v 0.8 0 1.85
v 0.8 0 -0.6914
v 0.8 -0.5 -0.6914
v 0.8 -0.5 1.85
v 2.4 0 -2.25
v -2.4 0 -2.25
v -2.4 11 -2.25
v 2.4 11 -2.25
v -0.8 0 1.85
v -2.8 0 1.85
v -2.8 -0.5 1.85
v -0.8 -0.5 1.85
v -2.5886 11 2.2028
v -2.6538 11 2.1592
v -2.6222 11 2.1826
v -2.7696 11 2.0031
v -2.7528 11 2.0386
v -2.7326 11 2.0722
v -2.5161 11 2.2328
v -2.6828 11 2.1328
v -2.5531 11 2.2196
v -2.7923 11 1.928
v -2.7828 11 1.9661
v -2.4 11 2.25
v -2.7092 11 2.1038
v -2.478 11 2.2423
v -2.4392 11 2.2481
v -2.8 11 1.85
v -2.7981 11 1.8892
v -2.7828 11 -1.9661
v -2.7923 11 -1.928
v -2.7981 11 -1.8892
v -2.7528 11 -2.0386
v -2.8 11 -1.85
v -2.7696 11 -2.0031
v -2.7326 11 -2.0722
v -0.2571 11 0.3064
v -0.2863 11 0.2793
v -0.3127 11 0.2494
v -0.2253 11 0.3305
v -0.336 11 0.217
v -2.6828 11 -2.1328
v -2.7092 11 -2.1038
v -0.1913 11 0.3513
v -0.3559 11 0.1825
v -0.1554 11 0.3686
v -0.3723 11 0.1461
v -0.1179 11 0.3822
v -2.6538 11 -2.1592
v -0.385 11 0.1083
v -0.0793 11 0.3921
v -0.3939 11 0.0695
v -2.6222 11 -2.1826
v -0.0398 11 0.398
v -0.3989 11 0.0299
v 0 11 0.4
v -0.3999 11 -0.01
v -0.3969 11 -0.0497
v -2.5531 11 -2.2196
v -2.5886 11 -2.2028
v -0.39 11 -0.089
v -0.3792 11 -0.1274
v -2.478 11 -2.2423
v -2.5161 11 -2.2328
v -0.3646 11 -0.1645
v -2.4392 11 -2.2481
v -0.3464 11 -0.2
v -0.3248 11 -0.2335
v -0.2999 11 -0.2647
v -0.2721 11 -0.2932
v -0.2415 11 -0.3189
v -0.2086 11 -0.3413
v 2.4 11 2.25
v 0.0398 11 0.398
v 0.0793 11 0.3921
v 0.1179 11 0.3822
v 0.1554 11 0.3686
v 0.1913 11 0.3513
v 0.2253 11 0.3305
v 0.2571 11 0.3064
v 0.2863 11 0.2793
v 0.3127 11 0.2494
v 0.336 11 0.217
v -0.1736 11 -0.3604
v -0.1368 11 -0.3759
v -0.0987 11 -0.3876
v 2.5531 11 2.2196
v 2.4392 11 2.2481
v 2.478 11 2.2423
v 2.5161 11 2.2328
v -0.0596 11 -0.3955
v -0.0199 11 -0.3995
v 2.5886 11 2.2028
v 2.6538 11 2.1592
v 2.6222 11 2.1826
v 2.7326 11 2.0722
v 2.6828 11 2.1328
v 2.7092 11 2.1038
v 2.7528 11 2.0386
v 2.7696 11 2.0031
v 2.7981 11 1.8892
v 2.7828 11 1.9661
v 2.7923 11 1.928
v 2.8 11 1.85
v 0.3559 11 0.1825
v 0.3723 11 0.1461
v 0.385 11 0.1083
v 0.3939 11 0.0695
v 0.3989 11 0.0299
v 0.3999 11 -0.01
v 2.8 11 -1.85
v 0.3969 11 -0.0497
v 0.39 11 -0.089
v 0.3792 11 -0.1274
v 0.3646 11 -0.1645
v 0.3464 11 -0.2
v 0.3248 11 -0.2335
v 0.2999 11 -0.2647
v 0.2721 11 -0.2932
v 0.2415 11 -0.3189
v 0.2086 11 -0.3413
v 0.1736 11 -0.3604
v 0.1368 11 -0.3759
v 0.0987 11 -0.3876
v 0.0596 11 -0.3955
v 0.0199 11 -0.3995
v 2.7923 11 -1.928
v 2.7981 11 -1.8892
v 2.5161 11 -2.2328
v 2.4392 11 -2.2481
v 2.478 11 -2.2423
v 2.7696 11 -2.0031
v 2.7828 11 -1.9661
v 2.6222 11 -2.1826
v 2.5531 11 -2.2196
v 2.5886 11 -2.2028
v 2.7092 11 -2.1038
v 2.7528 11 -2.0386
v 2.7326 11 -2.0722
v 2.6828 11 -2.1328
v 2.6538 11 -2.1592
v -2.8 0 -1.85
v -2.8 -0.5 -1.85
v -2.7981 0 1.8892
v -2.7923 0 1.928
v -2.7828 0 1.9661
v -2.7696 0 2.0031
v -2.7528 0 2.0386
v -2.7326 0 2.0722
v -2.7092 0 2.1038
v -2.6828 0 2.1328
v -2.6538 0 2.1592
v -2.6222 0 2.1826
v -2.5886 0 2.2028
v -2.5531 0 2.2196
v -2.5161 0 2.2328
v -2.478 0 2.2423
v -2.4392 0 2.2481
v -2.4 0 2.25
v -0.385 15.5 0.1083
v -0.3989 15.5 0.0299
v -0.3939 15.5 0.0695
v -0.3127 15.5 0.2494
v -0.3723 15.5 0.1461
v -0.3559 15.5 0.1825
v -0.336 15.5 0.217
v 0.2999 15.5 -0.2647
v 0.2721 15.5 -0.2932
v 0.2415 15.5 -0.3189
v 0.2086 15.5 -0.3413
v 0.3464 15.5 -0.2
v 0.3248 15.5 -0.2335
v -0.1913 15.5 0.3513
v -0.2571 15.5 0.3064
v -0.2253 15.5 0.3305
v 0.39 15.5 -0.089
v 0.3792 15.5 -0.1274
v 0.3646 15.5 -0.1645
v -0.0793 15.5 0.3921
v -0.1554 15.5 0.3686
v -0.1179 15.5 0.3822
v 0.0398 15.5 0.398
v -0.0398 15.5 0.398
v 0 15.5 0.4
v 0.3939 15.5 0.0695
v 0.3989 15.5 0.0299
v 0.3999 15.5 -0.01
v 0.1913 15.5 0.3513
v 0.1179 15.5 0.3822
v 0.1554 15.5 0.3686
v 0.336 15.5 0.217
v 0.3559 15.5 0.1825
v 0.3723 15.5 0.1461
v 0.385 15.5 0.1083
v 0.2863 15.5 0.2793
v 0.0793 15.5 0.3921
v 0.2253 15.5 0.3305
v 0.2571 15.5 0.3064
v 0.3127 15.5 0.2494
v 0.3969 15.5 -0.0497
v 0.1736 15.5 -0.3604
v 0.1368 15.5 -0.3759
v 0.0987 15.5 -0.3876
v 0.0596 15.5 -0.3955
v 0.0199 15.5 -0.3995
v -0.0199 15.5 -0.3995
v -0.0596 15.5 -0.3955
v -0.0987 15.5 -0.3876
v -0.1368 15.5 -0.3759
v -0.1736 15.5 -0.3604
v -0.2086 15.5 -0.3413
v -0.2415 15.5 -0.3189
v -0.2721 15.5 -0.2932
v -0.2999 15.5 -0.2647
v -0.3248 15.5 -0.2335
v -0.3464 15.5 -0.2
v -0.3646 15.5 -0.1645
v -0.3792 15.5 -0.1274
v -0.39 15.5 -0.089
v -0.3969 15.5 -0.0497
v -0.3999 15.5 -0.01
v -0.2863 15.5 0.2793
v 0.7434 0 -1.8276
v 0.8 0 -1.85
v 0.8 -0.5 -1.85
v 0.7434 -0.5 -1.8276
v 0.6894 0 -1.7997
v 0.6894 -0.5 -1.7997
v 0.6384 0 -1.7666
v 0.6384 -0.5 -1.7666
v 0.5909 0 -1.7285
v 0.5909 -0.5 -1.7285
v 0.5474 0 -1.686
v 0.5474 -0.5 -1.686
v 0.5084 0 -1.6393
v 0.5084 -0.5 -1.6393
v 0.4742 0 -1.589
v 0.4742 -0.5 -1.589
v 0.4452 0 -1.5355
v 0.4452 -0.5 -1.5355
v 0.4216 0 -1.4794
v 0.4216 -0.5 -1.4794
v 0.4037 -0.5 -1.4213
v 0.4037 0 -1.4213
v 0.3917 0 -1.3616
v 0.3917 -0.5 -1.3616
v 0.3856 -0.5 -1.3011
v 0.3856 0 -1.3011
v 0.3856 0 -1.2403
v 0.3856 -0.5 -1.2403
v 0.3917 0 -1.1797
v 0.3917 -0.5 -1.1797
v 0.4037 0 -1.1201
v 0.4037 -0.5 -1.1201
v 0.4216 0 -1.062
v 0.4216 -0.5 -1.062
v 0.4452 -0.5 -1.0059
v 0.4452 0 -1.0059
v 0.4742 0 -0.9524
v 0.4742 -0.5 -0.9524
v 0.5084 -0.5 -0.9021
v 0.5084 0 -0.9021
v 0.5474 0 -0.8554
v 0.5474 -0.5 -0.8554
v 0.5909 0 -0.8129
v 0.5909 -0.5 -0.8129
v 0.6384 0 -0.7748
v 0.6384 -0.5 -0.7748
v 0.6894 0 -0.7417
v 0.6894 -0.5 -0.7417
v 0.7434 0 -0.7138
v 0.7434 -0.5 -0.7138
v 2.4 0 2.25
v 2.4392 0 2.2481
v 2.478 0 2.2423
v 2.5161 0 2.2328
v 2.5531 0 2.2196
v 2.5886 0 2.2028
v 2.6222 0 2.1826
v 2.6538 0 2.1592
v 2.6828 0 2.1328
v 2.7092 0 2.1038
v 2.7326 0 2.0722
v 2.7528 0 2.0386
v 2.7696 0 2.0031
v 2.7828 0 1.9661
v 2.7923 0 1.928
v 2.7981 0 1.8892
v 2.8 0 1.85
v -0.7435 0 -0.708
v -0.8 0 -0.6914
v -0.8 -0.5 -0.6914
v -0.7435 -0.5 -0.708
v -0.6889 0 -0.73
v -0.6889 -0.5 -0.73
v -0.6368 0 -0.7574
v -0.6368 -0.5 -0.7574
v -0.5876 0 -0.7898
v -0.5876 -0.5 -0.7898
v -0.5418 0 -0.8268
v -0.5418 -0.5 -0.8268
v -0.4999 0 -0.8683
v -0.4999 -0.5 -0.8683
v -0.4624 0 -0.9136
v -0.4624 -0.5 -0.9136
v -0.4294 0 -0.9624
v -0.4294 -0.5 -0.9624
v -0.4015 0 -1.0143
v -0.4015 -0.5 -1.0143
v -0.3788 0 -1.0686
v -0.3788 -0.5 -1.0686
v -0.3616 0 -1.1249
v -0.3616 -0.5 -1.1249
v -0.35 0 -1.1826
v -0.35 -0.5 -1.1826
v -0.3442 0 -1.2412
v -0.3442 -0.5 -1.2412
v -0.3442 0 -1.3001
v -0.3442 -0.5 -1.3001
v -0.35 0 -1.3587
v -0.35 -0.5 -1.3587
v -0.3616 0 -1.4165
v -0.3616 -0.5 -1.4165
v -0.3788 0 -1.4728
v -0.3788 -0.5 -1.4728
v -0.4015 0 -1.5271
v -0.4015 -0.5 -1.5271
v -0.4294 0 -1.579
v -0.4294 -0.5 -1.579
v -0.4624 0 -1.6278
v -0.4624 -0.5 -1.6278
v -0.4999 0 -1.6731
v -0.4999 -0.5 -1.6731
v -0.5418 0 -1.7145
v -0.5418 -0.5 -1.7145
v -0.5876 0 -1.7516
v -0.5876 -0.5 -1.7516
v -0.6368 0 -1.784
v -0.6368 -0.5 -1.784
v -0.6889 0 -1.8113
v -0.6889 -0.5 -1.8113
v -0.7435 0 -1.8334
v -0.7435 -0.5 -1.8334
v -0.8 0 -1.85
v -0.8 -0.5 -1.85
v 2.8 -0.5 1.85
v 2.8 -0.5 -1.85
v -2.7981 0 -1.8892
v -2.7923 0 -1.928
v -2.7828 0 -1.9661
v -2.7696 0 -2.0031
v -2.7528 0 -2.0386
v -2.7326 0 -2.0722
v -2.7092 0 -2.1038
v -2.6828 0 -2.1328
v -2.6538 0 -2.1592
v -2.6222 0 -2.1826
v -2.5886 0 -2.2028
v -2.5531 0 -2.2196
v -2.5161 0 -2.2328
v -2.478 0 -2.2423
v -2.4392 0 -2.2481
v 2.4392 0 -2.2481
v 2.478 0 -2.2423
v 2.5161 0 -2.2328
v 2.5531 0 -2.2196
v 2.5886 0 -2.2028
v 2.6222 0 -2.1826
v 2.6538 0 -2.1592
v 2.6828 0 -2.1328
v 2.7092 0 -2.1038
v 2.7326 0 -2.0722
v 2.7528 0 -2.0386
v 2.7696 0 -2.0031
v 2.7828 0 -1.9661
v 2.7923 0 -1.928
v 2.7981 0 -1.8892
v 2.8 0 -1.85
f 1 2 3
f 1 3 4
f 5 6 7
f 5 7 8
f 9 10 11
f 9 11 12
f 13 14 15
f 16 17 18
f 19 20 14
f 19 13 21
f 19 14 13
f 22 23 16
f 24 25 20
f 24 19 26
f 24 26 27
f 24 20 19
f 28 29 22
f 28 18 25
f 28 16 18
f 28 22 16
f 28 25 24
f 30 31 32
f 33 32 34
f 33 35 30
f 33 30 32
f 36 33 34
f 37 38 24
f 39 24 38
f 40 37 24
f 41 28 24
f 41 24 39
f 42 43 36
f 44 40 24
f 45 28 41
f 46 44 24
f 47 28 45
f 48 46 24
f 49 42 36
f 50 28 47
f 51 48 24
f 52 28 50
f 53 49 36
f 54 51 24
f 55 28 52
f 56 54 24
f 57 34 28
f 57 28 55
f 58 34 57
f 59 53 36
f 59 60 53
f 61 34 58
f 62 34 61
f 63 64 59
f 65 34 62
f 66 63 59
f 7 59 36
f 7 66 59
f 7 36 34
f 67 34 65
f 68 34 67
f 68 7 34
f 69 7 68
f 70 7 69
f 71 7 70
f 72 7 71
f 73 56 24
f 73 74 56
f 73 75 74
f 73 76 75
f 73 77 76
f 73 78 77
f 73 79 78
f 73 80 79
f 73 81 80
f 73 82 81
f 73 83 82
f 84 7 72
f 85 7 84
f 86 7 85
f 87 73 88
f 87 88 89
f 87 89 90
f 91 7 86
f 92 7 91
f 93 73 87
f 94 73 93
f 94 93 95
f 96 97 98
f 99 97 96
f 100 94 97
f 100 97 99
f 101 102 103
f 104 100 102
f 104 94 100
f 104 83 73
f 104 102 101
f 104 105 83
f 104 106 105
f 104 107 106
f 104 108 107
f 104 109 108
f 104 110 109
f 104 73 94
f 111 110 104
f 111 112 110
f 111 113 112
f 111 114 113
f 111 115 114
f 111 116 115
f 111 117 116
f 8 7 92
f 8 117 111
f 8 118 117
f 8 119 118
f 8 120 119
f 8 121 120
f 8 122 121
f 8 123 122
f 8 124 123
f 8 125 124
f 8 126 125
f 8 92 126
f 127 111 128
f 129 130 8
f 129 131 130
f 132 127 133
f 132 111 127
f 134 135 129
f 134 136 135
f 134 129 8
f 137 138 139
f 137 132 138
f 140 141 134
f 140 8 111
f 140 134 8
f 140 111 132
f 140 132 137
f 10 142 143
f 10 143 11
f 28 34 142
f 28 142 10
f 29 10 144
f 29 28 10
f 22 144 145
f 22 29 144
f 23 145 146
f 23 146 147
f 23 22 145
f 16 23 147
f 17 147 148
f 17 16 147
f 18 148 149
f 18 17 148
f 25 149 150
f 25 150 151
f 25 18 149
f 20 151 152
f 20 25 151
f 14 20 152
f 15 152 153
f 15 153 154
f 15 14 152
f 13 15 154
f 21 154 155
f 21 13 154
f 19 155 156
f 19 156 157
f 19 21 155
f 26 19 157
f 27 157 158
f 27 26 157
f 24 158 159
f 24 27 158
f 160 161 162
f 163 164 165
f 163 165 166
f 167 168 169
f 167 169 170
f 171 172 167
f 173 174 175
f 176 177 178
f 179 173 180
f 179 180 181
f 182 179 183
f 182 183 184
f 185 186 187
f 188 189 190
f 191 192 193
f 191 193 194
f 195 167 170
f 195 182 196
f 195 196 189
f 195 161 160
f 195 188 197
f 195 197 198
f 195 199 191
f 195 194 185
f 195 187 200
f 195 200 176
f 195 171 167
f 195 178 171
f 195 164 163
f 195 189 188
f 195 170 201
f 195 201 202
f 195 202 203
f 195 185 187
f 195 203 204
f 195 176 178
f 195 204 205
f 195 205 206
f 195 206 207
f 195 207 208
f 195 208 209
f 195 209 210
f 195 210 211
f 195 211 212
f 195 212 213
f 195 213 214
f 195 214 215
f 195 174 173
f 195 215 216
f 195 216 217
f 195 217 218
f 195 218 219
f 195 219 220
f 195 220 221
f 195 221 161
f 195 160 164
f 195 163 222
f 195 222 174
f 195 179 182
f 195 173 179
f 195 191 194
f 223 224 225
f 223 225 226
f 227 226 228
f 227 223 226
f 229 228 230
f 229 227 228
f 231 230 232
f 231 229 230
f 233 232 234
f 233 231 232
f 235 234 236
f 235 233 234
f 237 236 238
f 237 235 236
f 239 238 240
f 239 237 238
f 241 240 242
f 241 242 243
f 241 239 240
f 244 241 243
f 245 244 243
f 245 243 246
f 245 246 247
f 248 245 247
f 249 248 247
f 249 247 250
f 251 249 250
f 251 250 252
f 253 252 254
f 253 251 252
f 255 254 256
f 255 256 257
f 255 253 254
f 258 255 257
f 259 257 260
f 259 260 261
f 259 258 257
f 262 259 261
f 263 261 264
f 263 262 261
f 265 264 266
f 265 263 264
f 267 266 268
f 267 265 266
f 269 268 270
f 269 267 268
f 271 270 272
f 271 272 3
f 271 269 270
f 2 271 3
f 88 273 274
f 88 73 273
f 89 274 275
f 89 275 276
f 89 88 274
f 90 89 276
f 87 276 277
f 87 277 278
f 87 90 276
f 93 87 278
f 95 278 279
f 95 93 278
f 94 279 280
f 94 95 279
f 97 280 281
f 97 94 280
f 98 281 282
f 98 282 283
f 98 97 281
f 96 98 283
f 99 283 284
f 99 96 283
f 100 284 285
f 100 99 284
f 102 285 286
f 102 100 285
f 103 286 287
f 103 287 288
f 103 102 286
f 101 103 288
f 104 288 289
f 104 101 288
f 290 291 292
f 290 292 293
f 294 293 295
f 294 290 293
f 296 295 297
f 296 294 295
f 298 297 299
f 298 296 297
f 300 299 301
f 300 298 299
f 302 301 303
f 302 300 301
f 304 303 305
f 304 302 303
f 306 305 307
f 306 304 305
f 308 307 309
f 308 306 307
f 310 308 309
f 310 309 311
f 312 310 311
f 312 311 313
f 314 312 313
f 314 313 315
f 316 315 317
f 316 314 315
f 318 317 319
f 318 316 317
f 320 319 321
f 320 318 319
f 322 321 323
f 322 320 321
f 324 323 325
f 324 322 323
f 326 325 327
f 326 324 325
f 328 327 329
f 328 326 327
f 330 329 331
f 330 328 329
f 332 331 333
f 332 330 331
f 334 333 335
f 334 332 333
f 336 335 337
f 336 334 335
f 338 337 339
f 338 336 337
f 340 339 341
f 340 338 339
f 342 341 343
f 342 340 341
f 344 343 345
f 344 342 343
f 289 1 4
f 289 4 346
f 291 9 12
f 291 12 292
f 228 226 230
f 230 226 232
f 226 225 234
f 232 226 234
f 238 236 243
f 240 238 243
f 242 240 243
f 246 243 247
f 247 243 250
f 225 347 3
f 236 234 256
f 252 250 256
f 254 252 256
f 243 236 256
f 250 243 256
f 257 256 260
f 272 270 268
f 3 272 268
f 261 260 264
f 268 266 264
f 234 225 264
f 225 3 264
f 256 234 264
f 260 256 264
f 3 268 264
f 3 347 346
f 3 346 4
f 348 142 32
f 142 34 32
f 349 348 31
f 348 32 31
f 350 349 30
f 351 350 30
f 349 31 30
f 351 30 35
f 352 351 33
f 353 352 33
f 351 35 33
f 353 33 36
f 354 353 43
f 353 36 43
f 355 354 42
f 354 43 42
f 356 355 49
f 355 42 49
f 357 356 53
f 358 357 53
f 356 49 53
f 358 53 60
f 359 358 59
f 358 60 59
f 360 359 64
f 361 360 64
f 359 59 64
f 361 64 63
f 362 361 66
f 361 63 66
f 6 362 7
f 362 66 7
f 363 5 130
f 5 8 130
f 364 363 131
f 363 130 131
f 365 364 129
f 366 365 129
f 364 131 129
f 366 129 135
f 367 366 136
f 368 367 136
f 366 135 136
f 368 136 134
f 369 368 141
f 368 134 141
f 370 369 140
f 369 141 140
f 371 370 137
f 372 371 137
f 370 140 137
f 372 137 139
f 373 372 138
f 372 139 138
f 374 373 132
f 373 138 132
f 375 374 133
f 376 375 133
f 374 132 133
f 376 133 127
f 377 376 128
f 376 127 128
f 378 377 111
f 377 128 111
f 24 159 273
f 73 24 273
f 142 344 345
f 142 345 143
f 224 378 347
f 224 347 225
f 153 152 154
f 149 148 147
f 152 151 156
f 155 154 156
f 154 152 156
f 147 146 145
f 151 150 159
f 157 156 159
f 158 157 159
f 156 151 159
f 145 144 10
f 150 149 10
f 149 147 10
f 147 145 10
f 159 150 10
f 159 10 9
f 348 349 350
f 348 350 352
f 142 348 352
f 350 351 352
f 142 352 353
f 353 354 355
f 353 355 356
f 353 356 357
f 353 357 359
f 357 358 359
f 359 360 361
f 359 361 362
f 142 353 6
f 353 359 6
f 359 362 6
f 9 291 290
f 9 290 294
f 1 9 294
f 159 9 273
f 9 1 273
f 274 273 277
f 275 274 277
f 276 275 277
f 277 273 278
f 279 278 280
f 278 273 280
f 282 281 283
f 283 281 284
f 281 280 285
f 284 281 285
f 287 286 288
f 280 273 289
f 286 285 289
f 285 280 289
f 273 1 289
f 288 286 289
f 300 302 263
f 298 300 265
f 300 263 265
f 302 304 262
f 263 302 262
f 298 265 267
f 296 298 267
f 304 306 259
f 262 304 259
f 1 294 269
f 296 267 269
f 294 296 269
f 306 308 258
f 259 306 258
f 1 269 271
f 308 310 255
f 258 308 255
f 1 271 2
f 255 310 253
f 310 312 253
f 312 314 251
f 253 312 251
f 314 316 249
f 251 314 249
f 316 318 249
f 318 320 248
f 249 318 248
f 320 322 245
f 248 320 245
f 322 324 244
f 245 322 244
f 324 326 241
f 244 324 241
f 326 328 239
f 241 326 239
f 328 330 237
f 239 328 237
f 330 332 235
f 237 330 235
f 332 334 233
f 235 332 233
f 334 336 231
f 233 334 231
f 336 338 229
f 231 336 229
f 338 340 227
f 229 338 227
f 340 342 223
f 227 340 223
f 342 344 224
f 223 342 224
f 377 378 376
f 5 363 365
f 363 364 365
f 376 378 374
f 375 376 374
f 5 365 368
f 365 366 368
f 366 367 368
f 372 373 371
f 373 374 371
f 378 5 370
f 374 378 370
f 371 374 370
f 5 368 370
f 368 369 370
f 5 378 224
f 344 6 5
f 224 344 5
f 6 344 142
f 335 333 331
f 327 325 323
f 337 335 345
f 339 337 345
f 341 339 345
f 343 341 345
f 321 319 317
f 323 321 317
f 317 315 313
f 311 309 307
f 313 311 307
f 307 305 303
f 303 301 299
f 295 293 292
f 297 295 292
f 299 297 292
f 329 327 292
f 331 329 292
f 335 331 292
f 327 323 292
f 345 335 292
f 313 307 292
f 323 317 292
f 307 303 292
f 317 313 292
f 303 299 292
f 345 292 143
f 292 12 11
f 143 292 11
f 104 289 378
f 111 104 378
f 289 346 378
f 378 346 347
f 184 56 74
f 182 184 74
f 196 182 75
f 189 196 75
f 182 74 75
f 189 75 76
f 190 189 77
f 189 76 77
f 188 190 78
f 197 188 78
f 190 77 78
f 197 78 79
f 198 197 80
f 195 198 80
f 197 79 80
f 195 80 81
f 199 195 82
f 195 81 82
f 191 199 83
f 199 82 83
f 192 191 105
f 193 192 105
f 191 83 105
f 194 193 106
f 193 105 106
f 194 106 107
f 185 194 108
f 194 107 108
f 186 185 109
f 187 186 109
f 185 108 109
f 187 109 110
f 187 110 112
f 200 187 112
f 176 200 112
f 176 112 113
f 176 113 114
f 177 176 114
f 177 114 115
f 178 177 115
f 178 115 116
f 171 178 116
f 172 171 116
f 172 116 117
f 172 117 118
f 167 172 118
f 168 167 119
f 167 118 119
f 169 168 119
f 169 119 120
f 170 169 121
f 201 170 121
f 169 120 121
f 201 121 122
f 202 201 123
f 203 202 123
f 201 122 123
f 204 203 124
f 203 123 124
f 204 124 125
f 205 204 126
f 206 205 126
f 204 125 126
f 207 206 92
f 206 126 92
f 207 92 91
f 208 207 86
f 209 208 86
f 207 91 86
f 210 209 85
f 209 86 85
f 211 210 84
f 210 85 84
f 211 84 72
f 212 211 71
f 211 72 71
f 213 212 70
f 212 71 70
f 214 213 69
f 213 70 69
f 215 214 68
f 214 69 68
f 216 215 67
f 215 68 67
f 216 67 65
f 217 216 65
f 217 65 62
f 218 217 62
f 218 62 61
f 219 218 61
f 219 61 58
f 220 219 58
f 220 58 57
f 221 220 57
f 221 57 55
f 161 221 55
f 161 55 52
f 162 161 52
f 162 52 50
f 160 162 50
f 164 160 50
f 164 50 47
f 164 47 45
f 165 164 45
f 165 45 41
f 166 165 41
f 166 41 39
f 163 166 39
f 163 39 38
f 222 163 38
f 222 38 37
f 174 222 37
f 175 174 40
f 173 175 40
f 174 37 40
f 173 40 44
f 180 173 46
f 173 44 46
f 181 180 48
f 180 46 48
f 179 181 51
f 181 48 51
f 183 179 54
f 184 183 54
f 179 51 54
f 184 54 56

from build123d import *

# Parameters (mm, degrees)
SKETCH1_W           = 5.6
SKETCH1_H           = 4.5
BOSS_EXTRUDE1_DEPTH = 11
SKETCH2_R           = 0.4
BOSS_EXTRUDE2_DEPTH = 4.5
FILLET1_R           = 0.4
BOSS_EXTRUDE3_DEPTH = 0.5


with BuildPart() as part:
    # Sketch1 → Boss-Extrude1 (new body)
    with BuildSketch(Plane(origin=(0, 0, 0), x_dir=(1, 0, 0), z_dir=(0, 1, 0))):
        Rectangle(SKETCH1_W, SKETCH1_H)
    extrude(amount=BOSS_EXTRUDE1_DEPTH)

    # Sketch2 → Boss-Extrude2 (add)
    with BuildSketch(Plane(origin=(0, 11, 0), x_dir=(1, 0, 0), z_dir=(0, 1, 0))):
        with Locations(Location((0, 0, 0), (0, 0, 270))):
            Circle(SKETCH2_R)
    extrude(amount=BOSS_EXTRUDE2_DEPTH)

    # Fillet1
    fillet1_edges = [part.edges().sort_by_distance(p)[0] for p in [
        (2.8, 5.5, 2.25),
        (-2.8, 5.5, 2.25),
        (-2.8, 5.5, -2.25),
        (2.8, 5.5, -2.25),
    ]]
    fillet(fillet1_edges, radius=FILLET1_R)

    # Sketch3 → Boss-Extrude3 (add)
    with BuildSketch(Plane.XZ):
        with BuildLine():
            Line((-2.8, 1.85), (-0.8, 1.85))
            Line((-0.8, 1.85), (-0.8, -0.691387744))
            ThreePointArc((-0.8, -0.691387744), (-0.34347642, -1.270693872), (-0.8, -1.85))
            Line((-0.8, -1.85), (-2.8, -1.85))
            Line((-2.8, -1.85), (-2.8, 1.85))
        make_face()
        with BuildLine():
            Line((2.8, -1.85), (0.8, -1.85))
            ThreePointArc((0.8, -1.85), (0.384893305, -1.270693872), (0.8, -0.691387744))
            Line((0.8, -0.691387744), (0.8, 1.85))
            Line((0.8, 1.85), (2.8, 1.85))
            Line((2.8, 1.85), (2.8, -1.85))
        make_face()
    extrude(amount=BOSS_EXTRUDE3_DEPTH)


solid = part.part
